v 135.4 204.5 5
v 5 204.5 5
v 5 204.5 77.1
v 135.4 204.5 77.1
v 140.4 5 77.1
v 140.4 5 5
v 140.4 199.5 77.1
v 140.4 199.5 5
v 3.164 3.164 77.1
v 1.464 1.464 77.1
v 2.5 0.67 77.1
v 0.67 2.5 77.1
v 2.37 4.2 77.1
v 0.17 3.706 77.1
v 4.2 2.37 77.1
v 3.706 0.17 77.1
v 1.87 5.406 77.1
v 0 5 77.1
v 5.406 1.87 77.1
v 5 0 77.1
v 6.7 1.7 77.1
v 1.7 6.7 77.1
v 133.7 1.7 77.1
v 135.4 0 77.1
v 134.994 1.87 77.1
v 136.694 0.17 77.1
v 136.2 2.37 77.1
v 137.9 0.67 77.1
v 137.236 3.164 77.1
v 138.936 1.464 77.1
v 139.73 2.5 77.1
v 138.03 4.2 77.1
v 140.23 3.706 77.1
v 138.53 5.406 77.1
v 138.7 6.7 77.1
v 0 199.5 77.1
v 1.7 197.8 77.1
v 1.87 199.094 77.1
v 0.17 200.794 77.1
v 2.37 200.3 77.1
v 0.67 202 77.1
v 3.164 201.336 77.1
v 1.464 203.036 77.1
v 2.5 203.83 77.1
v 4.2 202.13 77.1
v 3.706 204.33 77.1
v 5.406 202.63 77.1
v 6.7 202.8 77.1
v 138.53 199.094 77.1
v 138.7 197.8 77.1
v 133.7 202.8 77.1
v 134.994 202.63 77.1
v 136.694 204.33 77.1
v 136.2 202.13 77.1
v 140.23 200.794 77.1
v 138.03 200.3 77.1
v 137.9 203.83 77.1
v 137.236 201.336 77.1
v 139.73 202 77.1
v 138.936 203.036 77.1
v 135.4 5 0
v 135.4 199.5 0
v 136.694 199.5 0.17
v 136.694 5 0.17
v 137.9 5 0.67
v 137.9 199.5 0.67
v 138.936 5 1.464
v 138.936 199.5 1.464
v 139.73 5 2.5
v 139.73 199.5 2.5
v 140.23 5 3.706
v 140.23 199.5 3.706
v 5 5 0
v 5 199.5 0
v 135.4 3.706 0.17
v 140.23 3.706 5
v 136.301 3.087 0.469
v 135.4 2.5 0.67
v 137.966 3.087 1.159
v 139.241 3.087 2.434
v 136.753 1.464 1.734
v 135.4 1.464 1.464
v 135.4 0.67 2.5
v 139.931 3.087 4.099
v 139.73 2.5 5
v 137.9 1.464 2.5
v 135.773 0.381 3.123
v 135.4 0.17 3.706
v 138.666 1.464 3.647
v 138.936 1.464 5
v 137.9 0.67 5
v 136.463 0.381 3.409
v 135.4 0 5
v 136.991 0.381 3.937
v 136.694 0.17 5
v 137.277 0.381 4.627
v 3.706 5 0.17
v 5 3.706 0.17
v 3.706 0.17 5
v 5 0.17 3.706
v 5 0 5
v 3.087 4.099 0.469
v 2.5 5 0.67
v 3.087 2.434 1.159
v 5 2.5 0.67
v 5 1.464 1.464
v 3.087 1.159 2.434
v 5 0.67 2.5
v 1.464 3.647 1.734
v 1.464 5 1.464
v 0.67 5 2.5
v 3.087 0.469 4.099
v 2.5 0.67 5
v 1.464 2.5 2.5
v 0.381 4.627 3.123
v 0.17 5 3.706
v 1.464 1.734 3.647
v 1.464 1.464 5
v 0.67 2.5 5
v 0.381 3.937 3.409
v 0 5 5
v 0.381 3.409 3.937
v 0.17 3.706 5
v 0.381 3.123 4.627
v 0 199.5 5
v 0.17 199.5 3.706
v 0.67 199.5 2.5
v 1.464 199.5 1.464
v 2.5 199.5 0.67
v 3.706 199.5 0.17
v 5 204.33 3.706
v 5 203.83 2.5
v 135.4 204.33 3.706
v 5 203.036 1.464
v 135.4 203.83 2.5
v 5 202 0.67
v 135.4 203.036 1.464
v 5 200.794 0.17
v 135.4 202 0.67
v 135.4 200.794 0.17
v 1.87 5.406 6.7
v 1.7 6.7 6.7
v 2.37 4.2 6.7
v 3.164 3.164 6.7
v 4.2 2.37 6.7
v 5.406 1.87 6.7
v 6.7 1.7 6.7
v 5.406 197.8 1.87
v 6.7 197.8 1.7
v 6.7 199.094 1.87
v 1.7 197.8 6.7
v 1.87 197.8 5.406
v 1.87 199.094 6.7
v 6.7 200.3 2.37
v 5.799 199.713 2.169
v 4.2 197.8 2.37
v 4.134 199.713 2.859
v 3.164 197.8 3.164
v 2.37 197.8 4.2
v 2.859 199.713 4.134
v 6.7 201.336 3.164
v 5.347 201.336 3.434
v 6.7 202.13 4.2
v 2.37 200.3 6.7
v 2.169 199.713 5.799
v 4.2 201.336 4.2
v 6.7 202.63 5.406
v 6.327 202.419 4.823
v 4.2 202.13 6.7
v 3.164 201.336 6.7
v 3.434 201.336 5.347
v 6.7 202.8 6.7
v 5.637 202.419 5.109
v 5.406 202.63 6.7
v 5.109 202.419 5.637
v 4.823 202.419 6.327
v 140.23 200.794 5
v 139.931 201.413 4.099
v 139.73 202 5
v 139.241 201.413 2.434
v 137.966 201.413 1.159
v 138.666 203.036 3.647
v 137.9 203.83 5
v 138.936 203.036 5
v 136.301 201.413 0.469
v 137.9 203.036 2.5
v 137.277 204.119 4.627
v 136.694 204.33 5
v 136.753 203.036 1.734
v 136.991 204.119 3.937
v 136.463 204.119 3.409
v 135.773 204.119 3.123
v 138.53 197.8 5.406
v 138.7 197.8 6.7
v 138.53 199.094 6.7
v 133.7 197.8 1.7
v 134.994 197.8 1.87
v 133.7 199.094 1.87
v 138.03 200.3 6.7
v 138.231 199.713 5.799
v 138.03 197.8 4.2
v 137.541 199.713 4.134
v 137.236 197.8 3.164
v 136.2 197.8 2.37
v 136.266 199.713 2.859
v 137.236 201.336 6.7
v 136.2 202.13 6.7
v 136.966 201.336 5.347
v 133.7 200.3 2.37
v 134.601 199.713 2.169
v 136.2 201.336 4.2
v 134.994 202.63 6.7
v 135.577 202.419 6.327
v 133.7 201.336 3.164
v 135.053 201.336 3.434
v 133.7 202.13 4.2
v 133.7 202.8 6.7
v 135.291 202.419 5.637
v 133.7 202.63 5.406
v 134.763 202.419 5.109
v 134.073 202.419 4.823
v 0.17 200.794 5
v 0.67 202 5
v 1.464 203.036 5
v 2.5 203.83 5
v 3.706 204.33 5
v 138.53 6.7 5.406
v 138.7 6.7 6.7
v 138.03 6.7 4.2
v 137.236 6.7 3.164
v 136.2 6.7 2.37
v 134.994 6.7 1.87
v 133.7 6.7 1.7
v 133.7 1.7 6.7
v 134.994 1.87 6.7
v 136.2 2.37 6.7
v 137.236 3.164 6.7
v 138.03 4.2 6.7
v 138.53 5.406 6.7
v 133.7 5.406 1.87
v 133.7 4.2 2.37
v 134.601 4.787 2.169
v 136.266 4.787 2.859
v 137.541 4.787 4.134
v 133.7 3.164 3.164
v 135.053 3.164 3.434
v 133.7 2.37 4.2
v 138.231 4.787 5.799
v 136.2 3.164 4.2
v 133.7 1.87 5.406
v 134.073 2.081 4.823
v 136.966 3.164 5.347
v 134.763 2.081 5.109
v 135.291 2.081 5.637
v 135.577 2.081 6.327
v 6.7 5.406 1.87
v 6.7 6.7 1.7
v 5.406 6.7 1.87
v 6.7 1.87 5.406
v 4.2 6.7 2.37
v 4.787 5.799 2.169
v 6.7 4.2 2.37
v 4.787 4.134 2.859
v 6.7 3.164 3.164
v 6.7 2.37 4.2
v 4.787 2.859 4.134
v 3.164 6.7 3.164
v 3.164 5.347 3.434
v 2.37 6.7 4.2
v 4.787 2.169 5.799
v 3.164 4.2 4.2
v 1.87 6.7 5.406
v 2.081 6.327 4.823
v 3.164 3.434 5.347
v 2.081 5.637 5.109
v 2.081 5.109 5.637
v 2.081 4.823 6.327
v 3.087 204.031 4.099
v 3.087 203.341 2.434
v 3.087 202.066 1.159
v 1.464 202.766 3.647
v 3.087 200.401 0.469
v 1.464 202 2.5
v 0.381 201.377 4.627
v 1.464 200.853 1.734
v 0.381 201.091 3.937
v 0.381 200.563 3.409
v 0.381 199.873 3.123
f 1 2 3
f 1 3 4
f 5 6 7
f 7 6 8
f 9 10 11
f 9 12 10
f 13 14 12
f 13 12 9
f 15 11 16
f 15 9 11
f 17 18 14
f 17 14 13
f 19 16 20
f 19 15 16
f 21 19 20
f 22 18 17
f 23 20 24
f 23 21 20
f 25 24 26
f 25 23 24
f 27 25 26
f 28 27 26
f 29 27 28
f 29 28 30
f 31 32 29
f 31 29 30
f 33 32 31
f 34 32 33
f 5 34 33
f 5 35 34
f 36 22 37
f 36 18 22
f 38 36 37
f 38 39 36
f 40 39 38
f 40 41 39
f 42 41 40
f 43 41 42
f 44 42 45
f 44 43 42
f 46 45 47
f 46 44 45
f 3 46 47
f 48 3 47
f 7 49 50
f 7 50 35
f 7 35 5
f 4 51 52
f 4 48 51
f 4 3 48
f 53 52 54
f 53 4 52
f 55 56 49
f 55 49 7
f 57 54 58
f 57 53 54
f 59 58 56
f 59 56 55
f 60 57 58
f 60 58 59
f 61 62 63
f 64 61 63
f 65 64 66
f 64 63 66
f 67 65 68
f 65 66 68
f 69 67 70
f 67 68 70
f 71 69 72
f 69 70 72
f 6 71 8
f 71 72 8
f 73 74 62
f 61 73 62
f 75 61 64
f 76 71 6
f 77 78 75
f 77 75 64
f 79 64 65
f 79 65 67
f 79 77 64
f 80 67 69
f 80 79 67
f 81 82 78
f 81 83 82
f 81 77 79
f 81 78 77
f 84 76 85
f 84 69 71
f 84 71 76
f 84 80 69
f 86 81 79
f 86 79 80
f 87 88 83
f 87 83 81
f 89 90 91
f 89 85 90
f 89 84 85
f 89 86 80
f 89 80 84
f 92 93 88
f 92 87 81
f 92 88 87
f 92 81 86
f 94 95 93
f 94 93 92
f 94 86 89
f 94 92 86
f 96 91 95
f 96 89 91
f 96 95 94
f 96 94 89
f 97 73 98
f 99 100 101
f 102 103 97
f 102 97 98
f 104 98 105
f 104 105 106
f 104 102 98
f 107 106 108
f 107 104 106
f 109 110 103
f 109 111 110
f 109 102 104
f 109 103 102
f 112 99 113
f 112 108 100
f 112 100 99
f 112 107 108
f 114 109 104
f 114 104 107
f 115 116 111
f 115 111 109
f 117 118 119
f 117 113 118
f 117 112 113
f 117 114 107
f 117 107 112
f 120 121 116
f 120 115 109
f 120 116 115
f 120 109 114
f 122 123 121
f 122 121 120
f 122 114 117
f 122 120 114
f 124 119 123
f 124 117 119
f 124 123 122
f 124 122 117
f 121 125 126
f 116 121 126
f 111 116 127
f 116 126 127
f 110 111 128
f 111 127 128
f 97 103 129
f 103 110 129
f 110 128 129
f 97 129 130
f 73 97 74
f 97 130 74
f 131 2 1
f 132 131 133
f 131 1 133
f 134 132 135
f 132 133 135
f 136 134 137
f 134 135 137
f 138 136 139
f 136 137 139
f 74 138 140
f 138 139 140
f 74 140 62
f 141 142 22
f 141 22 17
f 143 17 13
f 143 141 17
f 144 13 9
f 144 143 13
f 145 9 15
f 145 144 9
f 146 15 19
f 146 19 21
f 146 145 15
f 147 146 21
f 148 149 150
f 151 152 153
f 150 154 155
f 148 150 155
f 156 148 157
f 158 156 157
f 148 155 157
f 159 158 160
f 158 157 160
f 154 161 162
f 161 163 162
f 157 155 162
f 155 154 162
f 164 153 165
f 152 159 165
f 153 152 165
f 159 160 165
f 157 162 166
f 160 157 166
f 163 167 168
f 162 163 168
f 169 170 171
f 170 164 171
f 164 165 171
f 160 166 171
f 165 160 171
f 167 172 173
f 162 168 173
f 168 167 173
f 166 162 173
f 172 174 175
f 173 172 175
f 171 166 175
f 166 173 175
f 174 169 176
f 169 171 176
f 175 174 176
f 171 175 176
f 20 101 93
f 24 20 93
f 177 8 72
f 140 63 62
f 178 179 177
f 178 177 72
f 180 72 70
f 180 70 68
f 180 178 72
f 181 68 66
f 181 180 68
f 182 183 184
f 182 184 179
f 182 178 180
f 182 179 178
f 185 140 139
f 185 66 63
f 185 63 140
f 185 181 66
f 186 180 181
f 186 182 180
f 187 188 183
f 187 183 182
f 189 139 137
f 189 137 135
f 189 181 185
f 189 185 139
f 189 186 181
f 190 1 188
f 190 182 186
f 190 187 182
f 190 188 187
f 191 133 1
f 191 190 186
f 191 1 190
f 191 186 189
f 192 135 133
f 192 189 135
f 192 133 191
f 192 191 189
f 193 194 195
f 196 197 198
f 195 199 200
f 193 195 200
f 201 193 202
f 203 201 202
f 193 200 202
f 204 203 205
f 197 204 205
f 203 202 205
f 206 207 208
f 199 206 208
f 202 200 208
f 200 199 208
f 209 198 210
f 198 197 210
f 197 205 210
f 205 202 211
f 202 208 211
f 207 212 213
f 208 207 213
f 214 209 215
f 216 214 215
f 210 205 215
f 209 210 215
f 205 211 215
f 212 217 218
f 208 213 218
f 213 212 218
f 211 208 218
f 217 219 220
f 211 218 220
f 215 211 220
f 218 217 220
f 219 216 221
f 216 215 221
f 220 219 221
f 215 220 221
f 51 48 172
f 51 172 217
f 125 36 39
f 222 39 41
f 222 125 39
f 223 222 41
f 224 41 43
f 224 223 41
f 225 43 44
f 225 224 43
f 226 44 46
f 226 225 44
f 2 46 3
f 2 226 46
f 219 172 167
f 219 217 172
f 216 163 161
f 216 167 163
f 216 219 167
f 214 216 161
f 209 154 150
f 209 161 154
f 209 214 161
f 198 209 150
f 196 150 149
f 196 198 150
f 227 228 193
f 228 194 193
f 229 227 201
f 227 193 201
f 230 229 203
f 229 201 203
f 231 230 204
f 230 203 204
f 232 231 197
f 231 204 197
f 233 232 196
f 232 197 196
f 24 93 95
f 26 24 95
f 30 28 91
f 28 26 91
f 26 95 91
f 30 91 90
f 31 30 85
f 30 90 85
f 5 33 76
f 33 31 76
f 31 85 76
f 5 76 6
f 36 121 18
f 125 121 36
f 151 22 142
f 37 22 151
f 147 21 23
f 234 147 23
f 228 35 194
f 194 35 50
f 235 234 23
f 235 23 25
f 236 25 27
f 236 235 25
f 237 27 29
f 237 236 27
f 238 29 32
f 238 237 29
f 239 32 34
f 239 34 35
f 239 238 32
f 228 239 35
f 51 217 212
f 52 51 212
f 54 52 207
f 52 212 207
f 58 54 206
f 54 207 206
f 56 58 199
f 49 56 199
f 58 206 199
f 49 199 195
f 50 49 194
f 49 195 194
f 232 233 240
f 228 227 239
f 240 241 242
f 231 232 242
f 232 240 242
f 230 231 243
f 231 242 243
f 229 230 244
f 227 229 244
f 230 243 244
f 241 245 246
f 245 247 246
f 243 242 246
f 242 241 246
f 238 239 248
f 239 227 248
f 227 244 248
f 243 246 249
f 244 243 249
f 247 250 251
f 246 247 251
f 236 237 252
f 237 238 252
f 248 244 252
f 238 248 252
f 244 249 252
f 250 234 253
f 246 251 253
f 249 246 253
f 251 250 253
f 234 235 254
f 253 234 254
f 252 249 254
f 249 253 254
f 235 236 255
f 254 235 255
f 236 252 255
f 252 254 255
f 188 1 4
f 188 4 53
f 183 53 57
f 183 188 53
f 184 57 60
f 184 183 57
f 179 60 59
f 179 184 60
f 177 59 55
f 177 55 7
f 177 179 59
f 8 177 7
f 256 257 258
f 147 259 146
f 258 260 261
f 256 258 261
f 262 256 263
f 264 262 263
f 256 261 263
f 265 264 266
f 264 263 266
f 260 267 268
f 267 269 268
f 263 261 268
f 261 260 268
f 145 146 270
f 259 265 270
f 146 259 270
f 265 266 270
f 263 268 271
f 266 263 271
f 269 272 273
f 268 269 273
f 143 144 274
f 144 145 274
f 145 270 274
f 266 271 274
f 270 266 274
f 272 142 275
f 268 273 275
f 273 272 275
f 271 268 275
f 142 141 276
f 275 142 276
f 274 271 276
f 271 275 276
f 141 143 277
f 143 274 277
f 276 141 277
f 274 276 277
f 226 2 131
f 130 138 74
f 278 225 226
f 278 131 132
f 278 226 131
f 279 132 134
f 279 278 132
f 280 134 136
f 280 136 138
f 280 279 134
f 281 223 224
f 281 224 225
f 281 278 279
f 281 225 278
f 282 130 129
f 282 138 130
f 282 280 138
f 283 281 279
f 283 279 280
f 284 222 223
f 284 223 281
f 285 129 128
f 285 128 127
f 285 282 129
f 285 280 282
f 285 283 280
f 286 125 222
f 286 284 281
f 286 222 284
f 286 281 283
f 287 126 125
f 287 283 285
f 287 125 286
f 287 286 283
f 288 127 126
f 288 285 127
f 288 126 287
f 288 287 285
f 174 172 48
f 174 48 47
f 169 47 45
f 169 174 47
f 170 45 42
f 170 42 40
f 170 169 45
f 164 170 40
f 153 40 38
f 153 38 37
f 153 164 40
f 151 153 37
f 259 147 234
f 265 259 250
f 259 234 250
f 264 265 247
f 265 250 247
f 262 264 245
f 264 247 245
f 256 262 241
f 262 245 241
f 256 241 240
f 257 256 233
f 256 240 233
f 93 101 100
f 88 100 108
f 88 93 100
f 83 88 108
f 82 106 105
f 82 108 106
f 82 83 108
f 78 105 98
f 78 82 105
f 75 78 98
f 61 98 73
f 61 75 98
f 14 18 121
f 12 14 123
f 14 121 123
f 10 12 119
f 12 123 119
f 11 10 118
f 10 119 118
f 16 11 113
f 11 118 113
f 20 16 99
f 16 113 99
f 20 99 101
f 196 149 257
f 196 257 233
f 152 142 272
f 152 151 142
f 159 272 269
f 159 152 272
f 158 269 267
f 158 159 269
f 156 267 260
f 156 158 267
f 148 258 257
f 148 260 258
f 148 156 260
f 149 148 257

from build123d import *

# Parameters (mm, degrees)
F0_W         = 140.4
F0_H         = 204.5
F1_DEPTH     = 77.1
F2_W         = 137
F2_H         = 201.1
F3_DEPTH     = 75.4
F4_R         = 5
F5_T1_DEPTH  = 70.4
F5_S5_W      = 5
F5_S5_H      = 5
F5_T6_DEPTH  = 5
F5_S11_W     = 5
F5_S11_H     = 5
F5_T12_DEPTH = 5
F5_S17_W     = 5
F5_S17_H     = 5
F5_T18_DEPTH = 5
F5_S23_W     = 5
F5_S23_H     = 5
F5_T24_DEPTH = 5
F5_T27_DEPTH = 84.6
F5_S31_W     = 5
F5_S31_H     = 5
F5_T32_DEPTH = 5
F5_S37_W     = 5
F5_S37_H     = 5
F5_T38_DEPTH = 5
F5_S43_W     = 5
F5_S43_H     = 5
F5_T44_DEPTH = 5
F5_S49_W     = 5
F5_S49_H     = 5
F5_T50_DEPTH = 5


# Not quite as in the source:
# - a fillet or chamfer that OpenCascade refuses, or shapes differently, is made with other operations: its cross-section is extruded or revolved along the edge and cut away or added


with BuildPart() as f1:
    # F0 (on Top) → F1 (new body)
    with BuildSketch(Plane.XY):
        with Locations((70.2, 102.25)):
            Rectangle(F0_W, F0_H)
    extrude(amount=F1_DEPTH)

    # F2 (on face) → F3 (cut)
    with BuildSketch(Plane.XY.offset(77.1)):
        with Locations((70.2, 102.25)):
            Rectangle(F2_W, F2_H)
    extrude(amount=-F3_DEPTH, mode=Mode.SUBTRACT)

    # F4
    f4_edges = [f1.edges().sort_by_distance(p)[0] for p in [
        (70.2, 202.8, 1.7),
        (1.7, 102.25, 1.7),
        (70.2, 1.7, 1.7),
        (138.7, 102.25, 1.7),
        (0, 102.25, 0),
        (70.2, 0, 0),
        (140.4, 102.25, 0),
        (70.2, 204.5, 0),
    ]]
    fillet(f4_edges, radius=F4_R)

    # F5: fillet of radius 5 on 8 edges, made by hand

    # F5_s2 → F5_t1 (join)
    with BuildSketch(Plane.XY.offset(6.7)):
        with BuildLine():
            ThreePointArc((133.7, 202.8), (137.2355339059, 201.3355339059), (138.7, 197.8))
            Line((138.7, 197.8), (138.7, 202.8))
            Line((138.7, 202.8), (133.7, 202.8))
        make_face()
        with BuildLine():
            ThreePointArc((6.7, 202.8), (3.1644660941, 201.3355339059), (1.7, 197.8))
            Line((1.7, 197.8), (1.7, 202.8))
            Line((1.7, 202.8), (6.7, 202.8))
        make_face()
        with BuildLine():
            ThreePointArc((1.7, 6.7), (3.1644660941, 3.1644660941), (6.7, 1.7))
            Line((6.7, 1.7), (1.7, 1.7))
            Line((1.7, 1.7), (1.7, 6.7))
        make_face()
        with BuildLine():
            ThreePointArc((133.7, 1.7), (137.2355339059, 3.1644660941), (138.7, 6.7))
            Line((138.7, 6.7), (138.7, 1.7))
            Line((138.7, 1.7), (133.7, 1.7))
        make_face()
    extrude(amount=F5_T1_DEPTH)


with BuildPart() as f5_tool4:
    # F5_s5 → F5_t6 (new body)
    with BuildSketch(Plane.XZ.offset(-6.7)):
        with Locations((136.2, 4.2)):
            Rectangle(F5_S5_W, F5_S5_H)
    extrude(amount=F5_T6_DEPTH)

    # F5_s7 → F5_t8 (revolve, cut)
    with BuildSketch(Plane(origin=(133.7, 6.7, 6.7), x_dir=(-0.7071067812, 0, 0.7071067812), z_dir=(0.7071067812, 0, 0.7071067812))):
        with BuildLine():
            ThreePointArc((0, -5), (5, 0), (0, 5))
            Line((0, 5), (0, -5))
        make_face()
    revolve(axis=Axis((133.7, 6.7, 6.7), (0, -1, 0)), mode=Mode.SUBTRACT)


with BuildPart() as f1_1:
    add(f1.part)

    # F5_t3: union F5_tool4
    add(f5_tool4.part)


with BuildPart() as f5_tool10:
    # F5_s11 → F5_t12 (new body)
    with BuildSketch(Plane.YZ.offset(6.7)):
        with Locations((4.2, 4.2)):
            Rectangle(F5_S11_W, F5_S11_H)
    extrude(amount=-F5_T12_DEPTH)

    # F5_s13 → F5_t14 (revolve, cut)
    with BuildSketch(Plane(origin=(6.7, 6.7, 6.7), x_dir=(0, 0.7071067812, 0.7071067812), z_dir=(0, -0.7071067812, 0.7071067812))):
        with BuildLine():
            ThreePointArc((0, -5), (5, 0), (0, 5))
            Line((0, 5), (0, -5))
        make_face()
    revolve(axis=Axis((6.7, 6.7, 6.7), (-1, 0, 0)), mode=Mode.SUBTRACT)


with BuildPart() as f1_2:
    add(f1_1.part)

    # F5_t9: union F5_tool10
    add(f5_tool10.part)


with BuildPart() as f5_tool16:
    # F5_s17 → F5_t18 (new body)
    with BuildSketch(Plane.XZ.offset(-197.8)):
        with Locations((4.2, 4.2)):
            Rectangle(F5_S17_W, F5_S17_H)
    extrude(amount=-F5_T18_DEPTH)

    # F5_s19 → F5_t20 (revolve, cut)
    with BuildSketch(Plane(origin=(6.7, 197.8, 6.7), x_dir=(0.7071067812, 0, 0.7071067812), z_dir=(-0.7071067812, 0, 0.7071067812))):
        with BuildLine():
            ThreePointArc((0, -5), (5, 0), (0, 5))
            Line((0, 5), (0, -5))
        make_face()
    revolve(axis=Axis((6.7, 197.8, 6.7), (0, 1, 0)), mode=Mode.SUBTRACT)


with BuildPart() as f1_3:
    add(f1_2.part)

    # F5_t15: union F5_tool16
    add(f5_tool16.part)


with BuildPart() as f5_tool22:
    # F5_s23 → F5_t24 (new body)
    with BuildSketch(Plane.XZ.offset(-197.8)):
        with Locations((136.2, 4.2)):
            Rectangle(F5_S23_W, F5_S23_H)
    extrude(amount=-F5_T24_DEPTH)

    # F5_s25 → F5_t26 (revolve, cut)
    with BuildSketch(Plane(origin=(133.7, 197.8, 6.7), x_dir=(-0.7071067812, 0, 0.7071067812), z_dir=(-0.7071067812, 0, -0.7071067812))):
        with BuildLine():
            ThreePointArc((0, -5), (5, 0), (0, 5))
            Line((0, 5), (0, -5))
        make_face()
    revolve(axis=Axis((133.7, 197.8, 6.7), (0, 1, 0)), mode=Mode.SUBTRACT)


with BuildPart() as f1_4:
    add(f1_3.part)

    # F5_t21: union F5_tool22
    add(f5_tool22.part)

    # F5_s28 → F5_t27 (cut)
    with BuildSketch(Plane.XY.offset(5)):
        with BuildLine():
            ThreePointArc((0, 5), (1.4644660941, 1.4644660941), (5, 0))
            Line((5, 0), (0, 0))
            Line((0, 0), (0, 5))
        make_face()
        with BuildLine():
            ThreePointArc((135.4, 0), (138.9355339059, 1.4644660941), (140.4, 5))
            Line((140.4, 5), (140.4, 0))
            Line((140.4, 0), (135.4, 0))
        make_face()
        with BuildLine():
            ThreePointArc((135.4, 204.5), (138.9355339059, 203.0355339059), (140.4, 199.5))
            Line((140.4, 199.5), (140.4, 204.5))
            Line((140.4, 204.5), (135.4, 204.5))
        make_face()
        with BuildLine():
            ThreePointArc((0, 199.5), (1.4644660941, 203.0355339059), (5, 204.5))
            Line((5, 204.5), (0, 204.5))
            Line((0, 204.5), (0, 199.5))
        make_face()
    extrude(amount=F5_T27_DEPTH, mode=Mode.SUBTRACT)


with BuildPart() as f5_tool30:
    # F5_s31 → F5_t32 (new body)
    with BuildSketch(Plane.YZ.offset(5)):
        with Locations((202, 2.5)):
            Rectangle(F5_S31_W, F5_S31_H)
    extrude(amount=-F5_T32_DEPTH)

    # F5_s33 → F5_t34 (revolve, cut)
    with BuildSketch(Plane(origin=(5, 199.5, 5), x_dir=(0, -0.7071067812, 0.7071067812), z_dir=(0, -0.7071067812, -0.7071067812))):
        with BuildLine():
            ThreePointArc((0, -5), (5, 0), (0, 5))
            Line((0, 5), (0, -5))
        make_face()
    revolve(axis=Axis((5, 199.5, 5), (-1, 0, 0)), mode=Mode.SUBTRACT)


with BuildPart() as f1_5:
    add(f1_4.part)

    # F5_t29: cut F5_tool30
    add(f5_tool30.part, mode=Mode.SUBTRACT)


with BuildPart() as f5_tool36:
    # F5_s37 → F5_t38 (new body)
    with BuildSketch(Plane.XZ.offset(-199.5)):
        with Locations((137.9, 2.5)):
            Rectangle(F5_S37_W, F5_S37_H)
    extrude(amount=-F5_T38_DEPTH)

    # F5_s39 → F5_t40 (revolve, cut)
    with BuildSketch(Plane(origin=(135.4, 199.5, 5), x_dir=(-0.7071067812, 0, 0.7071067812), z_dir=(-0.7071067812, 0, -0.7071067812))):
        with BuildLine():
            ThreePointArc((0, -5), (5, 0), (0, 5))
            Line((0, 5), (0, -5))
        make_face()
    revolve(axis=Axis((135.4, 199.5, 5), (0, 1, 0)), mode=Mode.SUBTRACT)


with BuildPart() as f1_6:
    add(f1_5.part)

    # F5_t35: cut F5_tool36
    add(f5_tool36.part, mode=Mode.SUBTRACT)


with BuildPart() as f5_tool42:
    # F5_s43 → F5_t44 (new body)
    with BuildSketch(Plane.XZ.offset(-5)):
        with Locations((137.9, 2.5)):
            Rectangle(F5_S43_W, F5_S43_H)
    extrude(amount=F5_T44_DEPTH)

    # F5_s45 → F5_t46 (revolve, cut)
    with BuildSketch(Plane(origin=(135.4, 5, 5), x_dir=(-0.7071067812, 0, 0.7071067812), z_dir=(0.7071067812, 0, 0.7071067812))):
        with BuildLine():
            ThreePointArc((0, -5), (5, 0), (0, 5))
            Line((0, 5), (0, -5))
        make_face()
    revolve(axis=Axis((135.4, 5, 5), (0, -1, 0)), mode=Mode.SUBTRACT)


with BuildPart() as f1_7:
    add(f1_6.part)

    # F5_t41: cut F5_tool42
    add(f5_tool42.part, mode=Mode.SUBTRACT)


with BuildPart() as f5_tool48:
    # F5_s49 → F5_t50 (new body)
    with BuildSketch(Plane.YZ.offset(5)):
        with Locations((2.5, 2.5)):
            Rectangle(F5_S49_W, F5_S49_H)
    extrude(amount=-F5_T50_DEPTH)

    # F5_s51 → F5_t52 (revolve, cut)
    with BuildSketch(Plane(origin=(5, 5, 5), x_dir=(0, 0.7071067812, 0.7071067812), z_dir=(0, -0.7071067812, 0.7071067812))):
        with BuildLine():
            ThreePointArc((0, -5), (5, 0), (0, 5))
            Line((0, 5), (0, -5))
        make_face()
    revolve(axis=Axis((5, 5, 5), (-1, 0, 0)), mode=Mode.SUBTRACT)


with BuildPart() as f1_8:
    add(f1_7.part)

    # F5_t47: cut F5_tool48
    add(f5_tool48.part, mode=Mode.SUBTRACT)


solid = f1_8.part
